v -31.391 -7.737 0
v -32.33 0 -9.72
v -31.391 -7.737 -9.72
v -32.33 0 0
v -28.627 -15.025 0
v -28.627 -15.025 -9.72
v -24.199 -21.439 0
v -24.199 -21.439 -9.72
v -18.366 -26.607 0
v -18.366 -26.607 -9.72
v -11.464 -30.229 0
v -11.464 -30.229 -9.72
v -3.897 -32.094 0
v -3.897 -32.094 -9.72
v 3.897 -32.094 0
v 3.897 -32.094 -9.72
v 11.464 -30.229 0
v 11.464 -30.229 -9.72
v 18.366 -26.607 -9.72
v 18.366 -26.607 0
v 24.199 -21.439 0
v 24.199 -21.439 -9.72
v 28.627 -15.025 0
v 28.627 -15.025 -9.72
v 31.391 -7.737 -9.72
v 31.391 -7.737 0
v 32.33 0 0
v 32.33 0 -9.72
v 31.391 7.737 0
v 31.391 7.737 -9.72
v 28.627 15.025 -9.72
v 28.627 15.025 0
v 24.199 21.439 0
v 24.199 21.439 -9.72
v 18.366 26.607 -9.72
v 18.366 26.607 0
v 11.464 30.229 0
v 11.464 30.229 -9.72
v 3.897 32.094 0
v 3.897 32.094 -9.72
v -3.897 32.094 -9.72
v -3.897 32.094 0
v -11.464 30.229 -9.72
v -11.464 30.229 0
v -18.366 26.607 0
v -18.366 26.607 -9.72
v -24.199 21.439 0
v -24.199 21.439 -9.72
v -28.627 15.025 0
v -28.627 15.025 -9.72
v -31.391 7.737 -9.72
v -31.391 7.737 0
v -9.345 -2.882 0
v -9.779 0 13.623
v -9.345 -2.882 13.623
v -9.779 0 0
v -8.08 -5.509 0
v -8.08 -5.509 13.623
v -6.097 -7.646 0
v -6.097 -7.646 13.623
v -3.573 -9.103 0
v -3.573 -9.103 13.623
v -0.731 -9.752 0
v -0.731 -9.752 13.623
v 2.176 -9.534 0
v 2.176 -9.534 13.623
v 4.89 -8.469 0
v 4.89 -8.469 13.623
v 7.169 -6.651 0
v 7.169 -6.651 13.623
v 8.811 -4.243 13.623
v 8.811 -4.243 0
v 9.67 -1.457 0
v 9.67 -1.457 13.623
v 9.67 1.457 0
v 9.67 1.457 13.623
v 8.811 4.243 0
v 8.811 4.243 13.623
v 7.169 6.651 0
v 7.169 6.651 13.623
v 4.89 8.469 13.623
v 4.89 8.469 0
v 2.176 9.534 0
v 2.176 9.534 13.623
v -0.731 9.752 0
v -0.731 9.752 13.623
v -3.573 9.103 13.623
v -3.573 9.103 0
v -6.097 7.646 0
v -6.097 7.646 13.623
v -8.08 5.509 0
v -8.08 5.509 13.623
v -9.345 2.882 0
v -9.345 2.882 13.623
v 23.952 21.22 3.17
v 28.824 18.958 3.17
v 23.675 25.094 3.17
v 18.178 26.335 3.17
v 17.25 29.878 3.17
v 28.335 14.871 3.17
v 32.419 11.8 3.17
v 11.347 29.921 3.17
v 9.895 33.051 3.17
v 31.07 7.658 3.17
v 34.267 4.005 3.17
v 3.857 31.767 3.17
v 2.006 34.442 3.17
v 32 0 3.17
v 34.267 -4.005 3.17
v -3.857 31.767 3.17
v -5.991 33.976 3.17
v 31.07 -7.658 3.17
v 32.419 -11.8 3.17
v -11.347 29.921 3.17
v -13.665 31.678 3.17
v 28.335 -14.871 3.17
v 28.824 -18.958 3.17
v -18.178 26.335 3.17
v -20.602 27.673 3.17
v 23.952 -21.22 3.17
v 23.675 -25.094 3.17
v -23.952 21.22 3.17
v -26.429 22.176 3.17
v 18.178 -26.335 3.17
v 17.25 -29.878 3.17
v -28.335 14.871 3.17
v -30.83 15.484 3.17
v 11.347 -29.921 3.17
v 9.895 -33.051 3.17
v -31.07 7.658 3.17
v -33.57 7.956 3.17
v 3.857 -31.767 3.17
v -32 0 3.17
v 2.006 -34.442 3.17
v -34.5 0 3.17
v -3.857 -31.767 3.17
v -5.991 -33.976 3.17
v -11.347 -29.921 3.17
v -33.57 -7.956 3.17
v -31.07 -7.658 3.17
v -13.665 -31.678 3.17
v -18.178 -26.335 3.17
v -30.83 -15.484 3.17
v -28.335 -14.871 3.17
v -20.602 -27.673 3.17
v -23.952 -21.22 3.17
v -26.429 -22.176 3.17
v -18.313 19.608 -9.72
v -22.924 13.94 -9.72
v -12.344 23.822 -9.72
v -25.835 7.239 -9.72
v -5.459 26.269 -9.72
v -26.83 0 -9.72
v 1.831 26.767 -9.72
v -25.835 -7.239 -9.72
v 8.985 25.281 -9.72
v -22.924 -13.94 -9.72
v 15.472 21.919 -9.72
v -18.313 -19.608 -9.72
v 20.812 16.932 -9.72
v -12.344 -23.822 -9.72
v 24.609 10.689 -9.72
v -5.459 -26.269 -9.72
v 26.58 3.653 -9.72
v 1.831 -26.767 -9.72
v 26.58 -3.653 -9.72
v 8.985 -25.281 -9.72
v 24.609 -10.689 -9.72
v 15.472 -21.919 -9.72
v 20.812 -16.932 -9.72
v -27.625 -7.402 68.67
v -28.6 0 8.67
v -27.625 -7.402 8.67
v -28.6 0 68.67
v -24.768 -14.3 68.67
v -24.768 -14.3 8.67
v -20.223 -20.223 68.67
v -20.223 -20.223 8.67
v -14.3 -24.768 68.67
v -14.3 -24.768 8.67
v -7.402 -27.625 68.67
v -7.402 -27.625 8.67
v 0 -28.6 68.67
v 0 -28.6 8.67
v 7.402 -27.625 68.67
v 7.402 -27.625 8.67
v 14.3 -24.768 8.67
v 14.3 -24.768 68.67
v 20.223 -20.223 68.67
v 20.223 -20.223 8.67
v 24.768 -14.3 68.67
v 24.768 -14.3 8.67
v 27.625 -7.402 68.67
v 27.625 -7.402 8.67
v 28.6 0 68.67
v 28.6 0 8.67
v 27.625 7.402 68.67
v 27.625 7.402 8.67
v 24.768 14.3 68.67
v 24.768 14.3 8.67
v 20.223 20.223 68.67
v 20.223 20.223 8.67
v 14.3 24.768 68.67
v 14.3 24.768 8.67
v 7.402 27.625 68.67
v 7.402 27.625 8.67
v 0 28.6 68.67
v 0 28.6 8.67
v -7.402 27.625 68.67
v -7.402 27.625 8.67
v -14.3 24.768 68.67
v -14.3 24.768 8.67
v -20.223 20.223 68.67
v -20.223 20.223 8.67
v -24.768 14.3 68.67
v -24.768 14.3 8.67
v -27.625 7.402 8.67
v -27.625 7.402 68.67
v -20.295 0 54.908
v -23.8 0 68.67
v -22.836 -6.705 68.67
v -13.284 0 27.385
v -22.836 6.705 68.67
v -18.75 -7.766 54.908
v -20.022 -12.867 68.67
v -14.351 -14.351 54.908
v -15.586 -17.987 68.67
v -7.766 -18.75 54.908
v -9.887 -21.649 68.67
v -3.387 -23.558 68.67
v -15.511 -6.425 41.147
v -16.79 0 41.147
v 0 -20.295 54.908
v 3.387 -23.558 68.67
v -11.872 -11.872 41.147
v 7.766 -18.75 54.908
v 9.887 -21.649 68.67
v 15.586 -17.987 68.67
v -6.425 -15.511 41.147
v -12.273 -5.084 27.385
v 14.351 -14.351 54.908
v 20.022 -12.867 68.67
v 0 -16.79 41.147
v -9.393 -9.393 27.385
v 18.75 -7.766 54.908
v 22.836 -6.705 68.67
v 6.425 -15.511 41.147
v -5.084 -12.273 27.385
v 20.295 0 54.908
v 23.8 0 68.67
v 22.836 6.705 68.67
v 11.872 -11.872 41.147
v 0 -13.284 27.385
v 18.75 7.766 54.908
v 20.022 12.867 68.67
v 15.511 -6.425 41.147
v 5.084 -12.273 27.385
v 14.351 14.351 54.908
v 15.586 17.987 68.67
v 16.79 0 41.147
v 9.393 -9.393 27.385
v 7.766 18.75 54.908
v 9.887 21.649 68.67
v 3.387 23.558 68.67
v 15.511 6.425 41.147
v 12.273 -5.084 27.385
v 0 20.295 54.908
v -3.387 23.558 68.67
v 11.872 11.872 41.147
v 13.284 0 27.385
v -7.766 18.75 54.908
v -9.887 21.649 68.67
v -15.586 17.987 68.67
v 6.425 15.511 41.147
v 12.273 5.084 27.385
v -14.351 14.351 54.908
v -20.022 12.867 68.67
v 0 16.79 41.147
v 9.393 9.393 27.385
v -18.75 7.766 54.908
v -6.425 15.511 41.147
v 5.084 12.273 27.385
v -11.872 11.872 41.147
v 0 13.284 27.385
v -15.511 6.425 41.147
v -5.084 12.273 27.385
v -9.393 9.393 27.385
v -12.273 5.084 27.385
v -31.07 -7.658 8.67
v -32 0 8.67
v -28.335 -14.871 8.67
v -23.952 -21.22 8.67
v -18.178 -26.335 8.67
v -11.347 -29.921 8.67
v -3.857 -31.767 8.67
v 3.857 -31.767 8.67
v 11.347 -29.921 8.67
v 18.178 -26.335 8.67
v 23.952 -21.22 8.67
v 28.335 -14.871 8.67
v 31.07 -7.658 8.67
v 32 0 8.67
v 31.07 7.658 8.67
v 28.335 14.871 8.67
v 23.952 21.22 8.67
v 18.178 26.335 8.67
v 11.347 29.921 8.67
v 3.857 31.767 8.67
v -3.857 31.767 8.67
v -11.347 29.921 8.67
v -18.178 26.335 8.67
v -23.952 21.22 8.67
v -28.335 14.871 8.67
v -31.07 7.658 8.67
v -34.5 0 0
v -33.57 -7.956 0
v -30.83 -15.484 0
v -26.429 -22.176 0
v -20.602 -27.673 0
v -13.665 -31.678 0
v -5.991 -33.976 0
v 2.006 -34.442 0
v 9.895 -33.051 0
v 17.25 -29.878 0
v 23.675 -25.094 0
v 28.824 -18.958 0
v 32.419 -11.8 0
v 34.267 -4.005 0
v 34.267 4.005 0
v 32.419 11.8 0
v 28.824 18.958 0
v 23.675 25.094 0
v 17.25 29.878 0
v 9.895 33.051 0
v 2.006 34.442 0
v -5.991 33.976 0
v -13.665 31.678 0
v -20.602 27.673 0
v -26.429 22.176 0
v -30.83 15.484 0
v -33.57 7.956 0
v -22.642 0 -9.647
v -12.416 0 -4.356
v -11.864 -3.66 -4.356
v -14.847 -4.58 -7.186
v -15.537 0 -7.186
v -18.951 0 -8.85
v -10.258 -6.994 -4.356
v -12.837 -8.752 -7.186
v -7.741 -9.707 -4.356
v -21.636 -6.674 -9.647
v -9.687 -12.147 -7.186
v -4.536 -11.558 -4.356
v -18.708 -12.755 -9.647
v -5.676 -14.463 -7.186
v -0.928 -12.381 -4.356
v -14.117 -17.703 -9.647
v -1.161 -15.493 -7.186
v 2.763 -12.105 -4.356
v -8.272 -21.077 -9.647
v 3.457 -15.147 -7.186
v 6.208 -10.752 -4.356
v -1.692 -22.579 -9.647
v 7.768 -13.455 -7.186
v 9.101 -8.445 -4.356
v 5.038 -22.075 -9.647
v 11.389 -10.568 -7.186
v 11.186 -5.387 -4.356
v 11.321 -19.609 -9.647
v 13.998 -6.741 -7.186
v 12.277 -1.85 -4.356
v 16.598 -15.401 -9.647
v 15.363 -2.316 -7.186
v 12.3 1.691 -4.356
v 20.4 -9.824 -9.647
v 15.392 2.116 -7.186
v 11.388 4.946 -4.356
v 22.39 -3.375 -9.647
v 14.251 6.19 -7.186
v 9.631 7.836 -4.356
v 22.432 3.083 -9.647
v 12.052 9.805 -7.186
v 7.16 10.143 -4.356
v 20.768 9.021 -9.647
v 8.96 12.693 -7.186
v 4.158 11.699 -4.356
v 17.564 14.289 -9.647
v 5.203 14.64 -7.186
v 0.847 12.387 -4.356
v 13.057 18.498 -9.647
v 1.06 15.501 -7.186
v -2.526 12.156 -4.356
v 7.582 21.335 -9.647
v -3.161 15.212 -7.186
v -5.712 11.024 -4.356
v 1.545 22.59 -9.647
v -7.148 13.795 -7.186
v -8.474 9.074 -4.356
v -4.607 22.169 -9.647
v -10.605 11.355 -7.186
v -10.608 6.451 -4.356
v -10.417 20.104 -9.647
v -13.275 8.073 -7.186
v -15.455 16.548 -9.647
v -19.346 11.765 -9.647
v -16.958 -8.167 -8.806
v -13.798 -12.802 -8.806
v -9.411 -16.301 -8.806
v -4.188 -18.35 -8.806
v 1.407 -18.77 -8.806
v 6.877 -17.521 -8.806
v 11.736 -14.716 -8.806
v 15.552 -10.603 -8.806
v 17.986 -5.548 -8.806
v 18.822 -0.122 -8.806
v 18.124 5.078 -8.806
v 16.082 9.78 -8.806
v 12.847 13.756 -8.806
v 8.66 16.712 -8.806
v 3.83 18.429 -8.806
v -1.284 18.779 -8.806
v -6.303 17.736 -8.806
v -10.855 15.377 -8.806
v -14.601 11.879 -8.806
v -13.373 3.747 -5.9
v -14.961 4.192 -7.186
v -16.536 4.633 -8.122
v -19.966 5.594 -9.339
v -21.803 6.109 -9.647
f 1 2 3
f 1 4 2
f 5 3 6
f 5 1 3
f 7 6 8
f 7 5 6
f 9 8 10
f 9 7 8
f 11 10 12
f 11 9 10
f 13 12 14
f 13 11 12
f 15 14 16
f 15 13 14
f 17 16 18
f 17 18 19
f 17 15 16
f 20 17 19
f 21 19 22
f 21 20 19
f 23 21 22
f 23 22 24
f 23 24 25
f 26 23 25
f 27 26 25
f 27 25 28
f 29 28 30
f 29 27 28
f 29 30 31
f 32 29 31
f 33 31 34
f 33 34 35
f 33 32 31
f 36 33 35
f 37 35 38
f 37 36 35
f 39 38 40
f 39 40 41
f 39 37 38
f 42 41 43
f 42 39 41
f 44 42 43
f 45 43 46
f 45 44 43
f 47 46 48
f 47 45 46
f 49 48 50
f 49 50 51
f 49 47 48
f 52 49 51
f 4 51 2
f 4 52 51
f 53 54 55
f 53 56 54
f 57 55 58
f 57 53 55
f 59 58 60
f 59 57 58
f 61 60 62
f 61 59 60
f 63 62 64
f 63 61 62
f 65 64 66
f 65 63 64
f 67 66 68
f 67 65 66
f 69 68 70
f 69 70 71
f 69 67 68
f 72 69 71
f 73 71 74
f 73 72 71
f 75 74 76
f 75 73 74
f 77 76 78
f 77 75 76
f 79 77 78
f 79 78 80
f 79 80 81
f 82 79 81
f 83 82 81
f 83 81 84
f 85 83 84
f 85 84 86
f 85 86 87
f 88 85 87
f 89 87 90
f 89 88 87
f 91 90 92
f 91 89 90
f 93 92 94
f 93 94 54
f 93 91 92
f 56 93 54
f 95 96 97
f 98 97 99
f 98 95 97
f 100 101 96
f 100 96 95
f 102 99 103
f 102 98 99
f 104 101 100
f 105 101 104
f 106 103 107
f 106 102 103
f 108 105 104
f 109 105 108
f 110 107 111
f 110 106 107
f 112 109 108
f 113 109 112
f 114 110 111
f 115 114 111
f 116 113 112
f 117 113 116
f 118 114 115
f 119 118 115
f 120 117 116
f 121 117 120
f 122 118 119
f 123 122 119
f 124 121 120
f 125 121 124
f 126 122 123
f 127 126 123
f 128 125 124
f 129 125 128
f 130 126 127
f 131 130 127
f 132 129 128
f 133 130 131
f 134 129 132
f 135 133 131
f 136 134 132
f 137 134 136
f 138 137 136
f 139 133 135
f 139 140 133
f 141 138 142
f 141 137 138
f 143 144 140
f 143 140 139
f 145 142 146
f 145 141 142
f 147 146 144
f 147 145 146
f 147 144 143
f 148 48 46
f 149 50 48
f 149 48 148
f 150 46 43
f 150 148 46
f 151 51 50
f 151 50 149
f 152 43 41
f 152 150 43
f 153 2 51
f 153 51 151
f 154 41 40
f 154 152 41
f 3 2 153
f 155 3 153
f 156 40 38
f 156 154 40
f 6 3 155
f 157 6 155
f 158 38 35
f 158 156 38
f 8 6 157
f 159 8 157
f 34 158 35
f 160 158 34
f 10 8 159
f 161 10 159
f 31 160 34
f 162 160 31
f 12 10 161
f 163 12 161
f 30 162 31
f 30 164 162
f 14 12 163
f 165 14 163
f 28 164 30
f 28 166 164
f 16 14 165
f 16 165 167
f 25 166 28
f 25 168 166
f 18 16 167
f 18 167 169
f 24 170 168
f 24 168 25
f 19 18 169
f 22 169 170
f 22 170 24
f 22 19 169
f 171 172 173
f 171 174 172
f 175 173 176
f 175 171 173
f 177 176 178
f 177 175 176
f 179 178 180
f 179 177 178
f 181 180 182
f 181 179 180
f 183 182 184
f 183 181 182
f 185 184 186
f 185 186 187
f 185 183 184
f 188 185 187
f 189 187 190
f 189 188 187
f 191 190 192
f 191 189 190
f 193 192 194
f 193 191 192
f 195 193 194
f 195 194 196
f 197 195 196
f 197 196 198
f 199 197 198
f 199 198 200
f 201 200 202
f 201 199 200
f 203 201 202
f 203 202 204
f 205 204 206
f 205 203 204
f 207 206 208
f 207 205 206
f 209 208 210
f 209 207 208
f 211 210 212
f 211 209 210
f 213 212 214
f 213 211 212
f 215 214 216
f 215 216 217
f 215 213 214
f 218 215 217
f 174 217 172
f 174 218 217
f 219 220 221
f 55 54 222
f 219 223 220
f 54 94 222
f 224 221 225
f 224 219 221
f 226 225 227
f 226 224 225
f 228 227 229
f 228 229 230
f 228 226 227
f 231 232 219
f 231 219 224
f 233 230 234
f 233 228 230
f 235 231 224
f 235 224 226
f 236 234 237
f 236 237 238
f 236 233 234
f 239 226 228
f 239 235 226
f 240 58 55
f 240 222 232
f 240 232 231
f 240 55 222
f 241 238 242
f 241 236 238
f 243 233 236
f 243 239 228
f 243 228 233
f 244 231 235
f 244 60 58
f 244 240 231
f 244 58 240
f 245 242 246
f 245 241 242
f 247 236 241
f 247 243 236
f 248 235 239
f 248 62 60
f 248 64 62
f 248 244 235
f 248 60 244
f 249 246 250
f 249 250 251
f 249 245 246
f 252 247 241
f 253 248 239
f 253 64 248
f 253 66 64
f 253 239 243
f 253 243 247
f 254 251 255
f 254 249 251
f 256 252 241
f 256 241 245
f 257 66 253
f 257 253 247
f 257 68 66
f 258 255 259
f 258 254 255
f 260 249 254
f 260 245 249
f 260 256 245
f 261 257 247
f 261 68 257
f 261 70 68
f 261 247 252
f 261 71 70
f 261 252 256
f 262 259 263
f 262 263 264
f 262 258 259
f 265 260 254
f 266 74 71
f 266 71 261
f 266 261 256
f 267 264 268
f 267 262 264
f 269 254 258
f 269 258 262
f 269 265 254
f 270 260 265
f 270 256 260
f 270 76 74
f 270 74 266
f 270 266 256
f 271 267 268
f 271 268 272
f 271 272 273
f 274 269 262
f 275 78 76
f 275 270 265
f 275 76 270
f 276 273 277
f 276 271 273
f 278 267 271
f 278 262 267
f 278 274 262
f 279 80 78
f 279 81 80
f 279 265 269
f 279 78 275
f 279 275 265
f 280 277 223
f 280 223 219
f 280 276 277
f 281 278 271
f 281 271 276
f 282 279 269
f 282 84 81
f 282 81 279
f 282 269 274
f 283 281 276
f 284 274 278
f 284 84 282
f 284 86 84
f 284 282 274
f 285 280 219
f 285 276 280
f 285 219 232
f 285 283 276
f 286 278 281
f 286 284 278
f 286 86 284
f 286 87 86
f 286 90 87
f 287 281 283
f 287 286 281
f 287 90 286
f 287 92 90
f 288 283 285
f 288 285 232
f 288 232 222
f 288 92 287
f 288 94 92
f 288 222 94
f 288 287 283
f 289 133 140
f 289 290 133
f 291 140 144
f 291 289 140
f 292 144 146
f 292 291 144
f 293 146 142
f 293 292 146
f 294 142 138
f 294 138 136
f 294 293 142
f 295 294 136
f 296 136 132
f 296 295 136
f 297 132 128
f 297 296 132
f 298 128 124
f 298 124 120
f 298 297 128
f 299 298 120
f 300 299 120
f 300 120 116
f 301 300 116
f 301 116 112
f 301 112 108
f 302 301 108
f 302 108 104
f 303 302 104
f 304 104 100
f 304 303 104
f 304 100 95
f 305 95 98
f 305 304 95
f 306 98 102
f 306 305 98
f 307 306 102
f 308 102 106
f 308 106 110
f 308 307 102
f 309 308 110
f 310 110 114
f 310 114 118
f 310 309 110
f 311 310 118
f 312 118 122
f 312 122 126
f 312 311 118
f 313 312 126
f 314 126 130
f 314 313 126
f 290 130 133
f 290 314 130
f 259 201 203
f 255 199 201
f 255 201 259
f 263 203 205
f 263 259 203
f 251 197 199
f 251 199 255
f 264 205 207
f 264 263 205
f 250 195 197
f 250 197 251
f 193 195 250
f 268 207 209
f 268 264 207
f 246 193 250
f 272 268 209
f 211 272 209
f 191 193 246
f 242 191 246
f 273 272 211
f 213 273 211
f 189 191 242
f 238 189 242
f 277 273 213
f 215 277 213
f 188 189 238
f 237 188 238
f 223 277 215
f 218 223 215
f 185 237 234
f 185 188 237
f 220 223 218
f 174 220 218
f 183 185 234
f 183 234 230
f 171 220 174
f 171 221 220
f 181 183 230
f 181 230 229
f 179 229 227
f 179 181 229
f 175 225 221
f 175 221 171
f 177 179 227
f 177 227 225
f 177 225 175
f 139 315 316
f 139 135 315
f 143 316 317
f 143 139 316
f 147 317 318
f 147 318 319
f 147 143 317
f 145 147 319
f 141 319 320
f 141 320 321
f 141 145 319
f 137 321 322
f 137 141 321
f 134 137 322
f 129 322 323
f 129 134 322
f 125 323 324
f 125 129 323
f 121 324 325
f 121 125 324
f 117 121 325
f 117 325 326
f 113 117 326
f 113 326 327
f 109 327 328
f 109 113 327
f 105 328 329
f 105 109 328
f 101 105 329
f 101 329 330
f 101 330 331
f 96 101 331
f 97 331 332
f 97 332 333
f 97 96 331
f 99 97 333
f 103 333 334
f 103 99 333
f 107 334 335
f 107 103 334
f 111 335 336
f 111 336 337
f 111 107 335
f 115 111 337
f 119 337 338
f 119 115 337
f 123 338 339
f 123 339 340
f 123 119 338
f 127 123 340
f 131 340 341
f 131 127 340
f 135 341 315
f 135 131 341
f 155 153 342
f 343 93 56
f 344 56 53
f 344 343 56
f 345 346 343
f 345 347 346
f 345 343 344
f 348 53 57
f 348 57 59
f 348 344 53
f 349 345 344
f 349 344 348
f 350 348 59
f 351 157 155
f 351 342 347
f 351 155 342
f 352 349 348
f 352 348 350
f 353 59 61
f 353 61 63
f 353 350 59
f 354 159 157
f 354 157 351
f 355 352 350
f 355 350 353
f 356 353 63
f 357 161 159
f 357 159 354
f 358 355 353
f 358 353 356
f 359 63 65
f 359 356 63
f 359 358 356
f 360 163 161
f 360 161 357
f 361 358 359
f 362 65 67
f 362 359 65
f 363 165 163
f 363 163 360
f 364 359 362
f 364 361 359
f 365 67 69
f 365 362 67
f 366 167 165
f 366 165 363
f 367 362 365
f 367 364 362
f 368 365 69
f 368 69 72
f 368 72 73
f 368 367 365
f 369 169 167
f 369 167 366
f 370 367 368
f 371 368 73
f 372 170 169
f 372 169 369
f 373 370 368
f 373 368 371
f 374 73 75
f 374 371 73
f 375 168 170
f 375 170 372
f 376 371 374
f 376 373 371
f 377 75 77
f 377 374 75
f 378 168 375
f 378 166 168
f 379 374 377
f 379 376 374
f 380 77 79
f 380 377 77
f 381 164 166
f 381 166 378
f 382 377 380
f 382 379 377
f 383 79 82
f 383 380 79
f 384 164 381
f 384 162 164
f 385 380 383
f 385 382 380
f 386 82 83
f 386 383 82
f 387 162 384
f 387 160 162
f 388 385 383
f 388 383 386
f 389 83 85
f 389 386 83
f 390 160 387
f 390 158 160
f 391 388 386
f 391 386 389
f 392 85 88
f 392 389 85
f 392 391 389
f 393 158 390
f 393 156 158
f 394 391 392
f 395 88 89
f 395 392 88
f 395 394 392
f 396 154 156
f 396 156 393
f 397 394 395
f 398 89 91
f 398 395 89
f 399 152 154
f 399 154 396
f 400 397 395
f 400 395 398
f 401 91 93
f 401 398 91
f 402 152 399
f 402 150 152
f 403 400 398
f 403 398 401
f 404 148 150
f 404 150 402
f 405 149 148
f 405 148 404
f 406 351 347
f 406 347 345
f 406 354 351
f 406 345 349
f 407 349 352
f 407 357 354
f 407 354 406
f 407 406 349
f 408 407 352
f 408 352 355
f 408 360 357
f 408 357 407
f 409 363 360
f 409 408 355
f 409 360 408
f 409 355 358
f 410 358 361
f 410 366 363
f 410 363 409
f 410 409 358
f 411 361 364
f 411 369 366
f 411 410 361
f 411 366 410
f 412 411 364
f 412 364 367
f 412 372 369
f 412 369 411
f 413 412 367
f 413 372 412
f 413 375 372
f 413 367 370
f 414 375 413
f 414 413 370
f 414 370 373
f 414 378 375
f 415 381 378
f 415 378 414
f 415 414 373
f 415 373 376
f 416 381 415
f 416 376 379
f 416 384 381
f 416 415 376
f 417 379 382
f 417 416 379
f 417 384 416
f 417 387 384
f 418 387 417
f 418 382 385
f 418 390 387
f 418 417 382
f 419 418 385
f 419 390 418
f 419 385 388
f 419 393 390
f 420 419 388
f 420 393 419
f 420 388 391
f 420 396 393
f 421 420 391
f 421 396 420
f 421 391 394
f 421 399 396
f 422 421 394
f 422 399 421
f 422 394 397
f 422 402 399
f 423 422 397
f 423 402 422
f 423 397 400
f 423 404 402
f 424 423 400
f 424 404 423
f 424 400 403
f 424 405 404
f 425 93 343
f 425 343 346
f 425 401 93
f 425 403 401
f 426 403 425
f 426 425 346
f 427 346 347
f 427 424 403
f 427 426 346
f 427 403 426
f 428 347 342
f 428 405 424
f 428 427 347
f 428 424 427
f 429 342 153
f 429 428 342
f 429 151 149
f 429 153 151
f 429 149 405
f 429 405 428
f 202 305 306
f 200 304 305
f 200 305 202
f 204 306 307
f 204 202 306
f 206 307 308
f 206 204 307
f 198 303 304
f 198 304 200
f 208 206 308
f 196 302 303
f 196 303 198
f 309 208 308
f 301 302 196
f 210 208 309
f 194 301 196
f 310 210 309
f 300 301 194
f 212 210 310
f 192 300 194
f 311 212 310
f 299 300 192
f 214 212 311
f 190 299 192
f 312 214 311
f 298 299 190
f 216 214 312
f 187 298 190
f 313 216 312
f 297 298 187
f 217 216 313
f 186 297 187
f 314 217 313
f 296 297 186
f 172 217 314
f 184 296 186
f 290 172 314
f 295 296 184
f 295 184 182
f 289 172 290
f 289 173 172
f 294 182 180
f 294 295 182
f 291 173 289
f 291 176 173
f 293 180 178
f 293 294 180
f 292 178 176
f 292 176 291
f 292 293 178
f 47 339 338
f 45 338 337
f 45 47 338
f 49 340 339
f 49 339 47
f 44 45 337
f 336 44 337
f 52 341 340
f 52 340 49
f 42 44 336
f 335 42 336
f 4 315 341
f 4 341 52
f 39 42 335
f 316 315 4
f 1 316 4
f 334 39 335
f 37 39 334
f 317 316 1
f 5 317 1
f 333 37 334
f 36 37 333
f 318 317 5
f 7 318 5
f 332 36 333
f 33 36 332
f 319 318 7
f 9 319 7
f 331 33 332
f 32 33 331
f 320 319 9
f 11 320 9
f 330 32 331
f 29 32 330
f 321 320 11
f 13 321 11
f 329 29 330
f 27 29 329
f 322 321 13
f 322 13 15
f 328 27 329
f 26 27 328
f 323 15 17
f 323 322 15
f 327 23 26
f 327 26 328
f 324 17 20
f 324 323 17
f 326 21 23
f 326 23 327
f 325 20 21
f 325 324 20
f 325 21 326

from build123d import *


with BuildPart() as part:
    # Sketch1 → Revolve4 (revolve)
    with BuildSketch(Plane(origin=(0, 0, 0), x_dir=(1, 0, 0), z_dir=(0, 1, 0)), mode=Mode.PRIVATE) as revolve4_sk:
        with BuildLine():
            add(Edge.make_bspline(
                [(9.779, 0), (14.416661489, 10.52798938), (26.83, 9.72)],
                knots=[0, 0, 0, 1, 1, 1], degree=2))
            Line((26.83, 9.72), (32.33, 9.72))
            Line((32.33, 9.72), (32.33, 0))
            Line((32.33, 0), (34.5, 0))
            Line((34.5, 0), (34.5, -3.170406434))
            Line((34.5, -3.170406434), (32, -3.170406434))
            Line((32, -3.170406434), (32, -8.670406434))
            Line((32, -8.670406434), (28.6, -8.670406434))
            Line((28.6, -8.670406434), (28.6, -68.670406434))
            Line((28.6, -68.670406434), (23.8, -68.670406434))
            Line((23.8, -68.670406434), (9.779, -13.6226))
            Line((9.779, -13.6226), (9.779, -8.8474))
            Line((9.779, -8.8474), (9.779, 0))
        make_face()
    revolve(revolve4_sk.sketch.rotate(Axis((0, 0, 0), (0, 0, 1)), 180), axis=Axis((0, 0, 0), (0, 0, 1)))


solid = part.part
